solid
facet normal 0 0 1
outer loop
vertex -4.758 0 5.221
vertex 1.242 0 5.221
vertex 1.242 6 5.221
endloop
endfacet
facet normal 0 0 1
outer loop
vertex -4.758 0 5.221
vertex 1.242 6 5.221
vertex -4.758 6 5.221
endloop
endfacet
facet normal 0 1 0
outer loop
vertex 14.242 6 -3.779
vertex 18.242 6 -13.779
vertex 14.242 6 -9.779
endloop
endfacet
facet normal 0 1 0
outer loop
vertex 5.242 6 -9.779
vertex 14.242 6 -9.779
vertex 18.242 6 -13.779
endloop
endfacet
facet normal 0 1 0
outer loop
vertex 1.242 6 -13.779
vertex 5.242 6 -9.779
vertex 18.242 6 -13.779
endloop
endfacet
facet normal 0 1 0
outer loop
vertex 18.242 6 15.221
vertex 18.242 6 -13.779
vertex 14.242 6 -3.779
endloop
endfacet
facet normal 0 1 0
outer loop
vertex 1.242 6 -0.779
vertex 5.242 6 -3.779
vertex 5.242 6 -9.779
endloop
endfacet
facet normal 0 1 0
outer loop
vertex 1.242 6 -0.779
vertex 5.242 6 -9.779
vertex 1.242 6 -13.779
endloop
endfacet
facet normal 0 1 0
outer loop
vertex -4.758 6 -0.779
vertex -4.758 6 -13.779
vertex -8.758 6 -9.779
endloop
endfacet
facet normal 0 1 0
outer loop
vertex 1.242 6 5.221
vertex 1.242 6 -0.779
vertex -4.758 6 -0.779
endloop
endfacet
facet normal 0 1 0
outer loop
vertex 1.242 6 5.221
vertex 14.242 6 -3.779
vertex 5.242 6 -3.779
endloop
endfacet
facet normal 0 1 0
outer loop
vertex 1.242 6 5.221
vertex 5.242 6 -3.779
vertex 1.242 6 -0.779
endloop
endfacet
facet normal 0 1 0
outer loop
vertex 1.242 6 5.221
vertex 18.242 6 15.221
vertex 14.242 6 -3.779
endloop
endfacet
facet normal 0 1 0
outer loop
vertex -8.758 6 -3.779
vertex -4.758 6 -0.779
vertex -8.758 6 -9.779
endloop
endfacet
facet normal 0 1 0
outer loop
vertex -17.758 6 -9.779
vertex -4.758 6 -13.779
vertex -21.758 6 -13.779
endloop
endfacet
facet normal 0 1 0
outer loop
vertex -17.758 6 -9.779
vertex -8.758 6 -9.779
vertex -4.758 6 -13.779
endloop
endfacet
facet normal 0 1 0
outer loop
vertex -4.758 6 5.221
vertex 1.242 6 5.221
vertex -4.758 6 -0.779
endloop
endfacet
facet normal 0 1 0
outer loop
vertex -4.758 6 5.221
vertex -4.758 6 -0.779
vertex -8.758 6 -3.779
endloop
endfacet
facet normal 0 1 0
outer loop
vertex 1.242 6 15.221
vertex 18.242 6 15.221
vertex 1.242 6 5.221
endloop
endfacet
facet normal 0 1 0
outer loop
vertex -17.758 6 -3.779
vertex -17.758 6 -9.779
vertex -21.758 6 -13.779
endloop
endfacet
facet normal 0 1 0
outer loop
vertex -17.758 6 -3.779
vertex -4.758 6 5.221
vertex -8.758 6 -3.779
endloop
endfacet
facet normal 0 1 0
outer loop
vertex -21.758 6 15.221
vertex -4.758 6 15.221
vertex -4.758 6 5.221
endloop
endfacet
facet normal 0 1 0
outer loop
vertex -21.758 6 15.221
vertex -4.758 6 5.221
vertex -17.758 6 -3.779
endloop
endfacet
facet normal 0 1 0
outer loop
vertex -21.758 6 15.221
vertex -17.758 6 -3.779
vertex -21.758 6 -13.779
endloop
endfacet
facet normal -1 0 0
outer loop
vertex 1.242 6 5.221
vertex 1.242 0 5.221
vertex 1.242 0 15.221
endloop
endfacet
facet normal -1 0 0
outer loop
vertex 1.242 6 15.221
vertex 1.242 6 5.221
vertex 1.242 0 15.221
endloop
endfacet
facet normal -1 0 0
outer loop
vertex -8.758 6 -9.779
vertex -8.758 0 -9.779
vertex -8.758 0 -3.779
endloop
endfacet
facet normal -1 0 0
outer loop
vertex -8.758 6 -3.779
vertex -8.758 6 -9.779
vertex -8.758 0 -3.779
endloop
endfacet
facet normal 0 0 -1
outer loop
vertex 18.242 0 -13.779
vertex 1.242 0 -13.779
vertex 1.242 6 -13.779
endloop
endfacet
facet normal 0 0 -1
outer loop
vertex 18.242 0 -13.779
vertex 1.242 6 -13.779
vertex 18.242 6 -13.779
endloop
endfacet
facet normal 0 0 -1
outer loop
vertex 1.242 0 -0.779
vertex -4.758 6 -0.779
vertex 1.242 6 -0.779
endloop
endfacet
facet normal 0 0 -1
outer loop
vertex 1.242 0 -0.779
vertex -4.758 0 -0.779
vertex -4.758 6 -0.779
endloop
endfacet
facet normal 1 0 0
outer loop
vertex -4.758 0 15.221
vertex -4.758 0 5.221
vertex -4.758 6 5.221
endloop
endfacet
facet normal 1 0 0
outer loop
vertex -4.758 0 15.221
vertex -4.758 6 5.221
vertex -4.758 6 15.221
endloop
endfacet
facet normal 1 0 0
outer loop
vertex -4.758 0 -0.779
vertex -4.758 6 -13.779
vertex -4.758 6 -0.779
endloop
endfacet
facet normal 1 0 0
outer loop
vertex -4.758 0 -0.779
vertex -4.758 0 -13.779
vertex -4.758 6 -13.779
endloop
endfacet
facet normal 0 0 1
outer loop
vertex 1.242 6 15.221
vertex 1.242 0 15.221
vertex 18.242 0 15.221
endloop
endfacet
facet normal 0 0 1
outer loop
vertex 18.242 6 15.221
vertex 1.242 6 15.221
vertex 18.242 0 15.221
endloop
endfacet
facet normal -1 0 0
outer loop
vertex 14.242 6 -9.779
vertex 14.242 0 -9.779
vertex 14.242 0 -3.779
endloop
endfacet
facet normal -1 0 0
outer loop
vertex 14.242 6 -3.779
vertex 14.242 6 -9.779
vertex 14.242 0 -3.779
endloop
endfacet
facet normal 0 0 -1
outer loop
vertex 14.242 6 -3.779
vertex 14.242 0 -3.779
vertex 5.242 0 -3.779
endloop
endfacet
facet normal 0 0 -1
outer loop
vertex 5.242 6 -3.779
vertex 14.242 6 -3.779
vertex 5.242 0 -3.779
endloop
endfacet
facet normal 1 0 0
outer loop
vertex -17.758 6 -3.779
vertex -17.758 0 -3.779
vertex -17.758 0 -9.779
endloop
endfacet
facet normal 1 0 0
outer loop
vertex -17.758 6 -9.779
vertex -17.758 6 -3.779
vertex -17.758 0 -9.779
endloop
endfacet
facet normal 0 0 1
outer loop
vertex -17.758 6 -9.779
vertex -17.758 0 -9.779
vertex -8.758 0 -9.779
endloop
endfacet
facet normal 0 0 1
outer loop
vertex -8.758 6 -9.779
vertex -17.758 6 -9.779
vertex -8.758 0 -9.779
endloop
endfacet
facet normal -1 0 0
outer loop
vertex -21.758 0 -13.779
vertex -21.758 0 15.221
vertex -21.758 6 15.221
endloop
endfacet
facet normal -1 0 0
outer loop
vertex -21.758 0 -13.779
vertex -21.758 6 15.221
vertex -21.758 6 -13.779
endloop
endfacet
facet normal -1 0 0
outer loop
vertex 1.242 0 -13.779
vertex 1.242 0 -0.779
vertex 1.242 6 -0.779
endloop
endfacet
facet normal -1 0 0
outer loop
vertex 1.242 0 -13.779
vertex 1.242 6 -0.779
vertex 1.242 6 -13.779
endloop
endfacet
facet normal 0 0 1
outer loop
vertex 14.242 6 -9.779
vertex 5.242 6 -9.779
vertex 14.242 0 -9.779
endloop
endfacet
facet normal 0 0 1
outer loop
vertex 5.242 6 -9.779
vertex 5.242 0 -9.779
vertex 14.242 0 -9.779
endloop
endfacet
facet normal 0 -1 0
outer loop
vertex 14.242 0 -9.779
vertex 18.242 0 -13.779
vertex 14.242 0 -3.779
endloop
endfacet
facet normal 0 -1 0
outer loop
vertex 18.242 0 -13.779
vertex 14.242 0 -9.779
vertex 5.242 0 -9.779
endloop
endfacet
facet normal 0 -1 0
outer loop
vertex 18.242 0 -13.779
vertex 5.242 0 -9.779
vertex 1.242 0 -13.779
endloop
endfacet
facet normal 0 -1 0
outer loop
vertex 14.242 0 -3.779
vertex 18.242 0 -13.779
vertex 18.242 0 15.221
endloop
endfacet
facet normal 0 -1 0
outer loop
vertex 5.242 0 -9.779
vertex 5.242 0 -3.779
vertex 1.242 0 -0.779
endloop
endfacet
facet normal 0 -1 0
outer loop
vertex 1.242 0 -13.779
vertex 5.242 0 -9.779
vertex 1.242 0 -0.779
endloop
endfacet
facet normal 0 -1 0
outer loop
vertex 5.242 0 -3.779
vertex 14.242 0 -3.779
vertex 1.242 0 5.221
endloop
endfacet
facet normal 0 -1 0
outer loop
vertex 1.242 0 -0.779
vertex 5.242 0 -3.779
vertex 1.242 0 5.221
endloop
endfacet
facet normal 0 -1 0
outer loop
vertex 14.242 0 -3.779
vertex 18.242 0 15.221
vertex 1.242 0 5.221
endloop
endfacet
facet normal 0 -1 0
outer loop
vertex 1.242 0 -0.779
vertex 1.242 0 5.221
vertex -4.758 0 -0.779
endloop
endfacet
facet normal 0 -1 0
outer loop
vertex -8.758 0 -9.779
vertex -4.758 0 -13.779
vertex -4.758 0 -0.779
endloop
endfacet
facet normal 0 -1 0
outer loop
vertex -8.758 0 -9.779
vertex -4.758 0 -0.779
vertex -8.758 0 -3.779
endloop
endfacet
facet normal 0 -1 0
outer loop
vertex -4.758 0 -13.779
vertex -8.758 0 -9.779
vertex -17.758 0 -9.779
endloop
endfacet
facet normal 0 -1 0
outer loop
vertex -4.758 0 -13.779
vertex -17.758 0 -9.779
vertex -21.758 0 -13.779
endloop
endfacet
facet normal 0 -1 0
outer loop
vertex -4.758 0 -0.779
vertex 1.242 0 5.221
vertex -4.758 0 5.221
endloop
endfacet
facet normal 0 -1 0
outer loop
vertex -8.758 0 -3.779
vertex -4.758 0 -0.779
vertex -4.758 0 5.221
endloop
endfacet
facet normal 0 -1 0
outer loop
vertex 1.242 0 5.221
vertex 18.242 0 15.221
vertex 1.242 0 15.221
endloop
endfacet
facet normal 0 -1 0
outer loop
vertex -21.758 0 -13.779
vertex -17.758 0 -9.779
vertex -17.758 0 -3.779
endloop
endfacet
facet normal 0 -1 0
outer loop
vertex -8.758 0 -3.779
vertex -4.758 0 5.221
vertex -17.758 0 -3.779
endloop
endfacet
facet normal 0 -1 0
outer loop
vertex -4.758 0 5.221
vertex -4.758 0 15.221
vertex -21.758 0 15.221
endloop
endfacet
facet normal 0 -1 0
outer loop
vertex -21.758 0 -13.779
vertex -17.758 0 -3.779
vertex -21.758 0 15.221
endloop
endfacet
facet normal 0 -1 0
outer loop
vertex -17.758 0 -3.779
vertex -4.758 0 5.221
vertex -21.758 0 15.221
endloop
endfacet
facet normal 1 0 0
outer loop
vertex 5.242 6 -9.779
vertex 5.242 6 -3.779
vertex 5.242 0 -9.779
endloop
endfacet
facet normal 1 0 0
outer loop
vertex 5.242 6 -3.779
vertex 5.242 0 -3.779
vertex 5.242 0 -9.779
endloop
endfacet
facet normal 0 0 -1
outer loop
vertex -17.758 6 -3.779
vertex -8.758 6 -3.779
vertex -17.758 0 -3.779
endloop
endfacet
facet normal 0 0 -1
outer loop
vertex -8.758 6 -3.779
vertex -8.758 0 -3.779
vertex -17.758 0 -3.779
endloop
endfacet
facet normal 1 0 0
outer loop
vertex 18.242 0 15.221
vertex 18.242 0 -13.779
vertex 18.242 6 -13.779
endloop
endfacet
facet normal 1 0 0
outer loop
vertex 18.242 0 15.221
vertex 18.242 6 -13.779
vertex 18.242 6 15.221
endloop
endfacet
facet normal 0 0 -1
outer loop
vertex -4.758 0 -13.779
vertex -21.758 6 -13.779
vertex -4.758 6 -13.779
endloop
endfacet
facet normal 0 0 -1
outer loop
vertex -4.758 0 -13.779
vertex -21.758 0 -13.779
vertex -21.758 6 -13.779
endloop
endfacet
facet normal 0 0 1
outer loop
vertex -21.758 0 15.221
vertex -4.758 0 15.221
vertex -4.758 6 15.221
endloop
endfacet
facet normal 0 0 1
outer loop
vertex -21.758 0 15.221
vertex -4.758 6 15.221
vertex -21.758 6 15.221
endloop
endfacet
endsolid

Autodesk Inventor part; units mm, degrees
ref_plane "YZ Plane" through (0, 0, 0) normal (1, 0, 0) x (0, 1, 0)
ref_plane "XZ Plane" through (0, 0, 0) normal (0, 1, 0) x (-1, 0, 0)
ref_plane "XY Plane" through (0, 0, 0) normal (0, 0, 1) x (1, 0, 0)
sketch "Sketch1" plane through (0, 0, 0) normal (0, 1, 0) x (-1, 0, 0)
  line L0 (4.7584, -0.779) -> (21.7584, -0.779)
  line L1 (21.7584, -0.779) -> (21.7584, -13.779)
  line L2 (21.7584, -13.779) -> (4.7584, -13.779)
  line L3 (4.7584, -13.779) -> (4.7584, -0.779)
  line L4 (8.7584, -3.779) -> (17.7584, -3.779)
  line L5 (17.7584, -3.779) -> (17.7584, -9.779)
  line L6 (17.7584, -9.779) -> (8.7584, -9.779)
  line L7 (8.7584, -9.779) -> (8.7584, -3.779)
  line L8 (21.7584, -0.779) -> (-18.2416, -0.779)
  line L9 (-18.2416, -0.779) -> (-18.2416, 5.221)
  line L10 (-18.2416, 5.221) -> (21.7584, 5.221)
  line L11 (21.7584, 5.221) -> (21.7584, -0.779)
  line L12 (17.7584, -6.6245) -> (21.7584, -6.6245) construction
  line L13 (8.7584, -6.779) -> (4.7584, -6.779) construction
  line L14 (-18.2416, -0.779) -> (-1.2416, -0.779)
  line L15 (-1.2416, -0.779) -> (-1.2416, -13.779)
  line L16 (-1.2416, -13.779) -> (-18.2416, -13.779)
  line L17 (-18.2416, -13.779) -> (-18.2416, -0.779)
  line L18 (-14.2416, -3.779) -> (-5.2416, -3.779)
  line L19 (-5.2416, -3.779) -> (-5.2416, -9.779)
  line L20 (-5.2416, -9.779) -> (-14.2416, -9.779)
  line L21 (-14.2416, -9.779) -> (-14.2416, -3.779)
  line L22 (-5.2416, -6.779) -> (-1.2416, -6.779) construction
  line L23 (-18.2416, -6.779) -> (-14.2416, -6.779) construction
  line L24 (21.7584, 5.221) -> (4.7584, 5.221)
  line L25 (4.7584, 5.221) -> (4.7584, 15.221)
  line L26 (4.7584, 15.221) -> (21.7584, 15.221)
  line L27 (21.7584, 15.221) -> (21.7584, 5.221)
  line L28 (-18.2416, 5.221) -> (-1.2416, 5.221)
  line L29 (-1.2416, 5.221) -> (-1.2416, 15.221)
  line L30 (-1.2416, 15.221) -> (-18.2416, 15.221)
  line L31 (-18.2416, 15.221) -> (-18.2416, 5.221)
  point P0 (0, 0)
  dimension "d0" = 9
  dimension "d1" = 6
  dimension "d2" = 4
  dimension "d3" = 40
  dimension "d4" = 6
  dimension "d5" = 4
  dimension "d6" = 3
  dimension "d7" = 4
  dimension "d8" = 9
  dimension "d9" = 6
  dimension "d10" = 3
  dimension "d11" = 4
  dimension "d14" = 10
  dimension "d15" = 10
extrude "Extrusion1" add sketch "Sketch1" along normal blind 6
equation "\"d5\" = d2"
equation "\"d7\" = d2"
equation "\"d8\" = d0"
equation "\"d9\" = d1"
equation "\"d10\" = d6"
equation "\"d11\" = d5"
equation "\"d15\" = d14"
properties part number "flipper-holder"
